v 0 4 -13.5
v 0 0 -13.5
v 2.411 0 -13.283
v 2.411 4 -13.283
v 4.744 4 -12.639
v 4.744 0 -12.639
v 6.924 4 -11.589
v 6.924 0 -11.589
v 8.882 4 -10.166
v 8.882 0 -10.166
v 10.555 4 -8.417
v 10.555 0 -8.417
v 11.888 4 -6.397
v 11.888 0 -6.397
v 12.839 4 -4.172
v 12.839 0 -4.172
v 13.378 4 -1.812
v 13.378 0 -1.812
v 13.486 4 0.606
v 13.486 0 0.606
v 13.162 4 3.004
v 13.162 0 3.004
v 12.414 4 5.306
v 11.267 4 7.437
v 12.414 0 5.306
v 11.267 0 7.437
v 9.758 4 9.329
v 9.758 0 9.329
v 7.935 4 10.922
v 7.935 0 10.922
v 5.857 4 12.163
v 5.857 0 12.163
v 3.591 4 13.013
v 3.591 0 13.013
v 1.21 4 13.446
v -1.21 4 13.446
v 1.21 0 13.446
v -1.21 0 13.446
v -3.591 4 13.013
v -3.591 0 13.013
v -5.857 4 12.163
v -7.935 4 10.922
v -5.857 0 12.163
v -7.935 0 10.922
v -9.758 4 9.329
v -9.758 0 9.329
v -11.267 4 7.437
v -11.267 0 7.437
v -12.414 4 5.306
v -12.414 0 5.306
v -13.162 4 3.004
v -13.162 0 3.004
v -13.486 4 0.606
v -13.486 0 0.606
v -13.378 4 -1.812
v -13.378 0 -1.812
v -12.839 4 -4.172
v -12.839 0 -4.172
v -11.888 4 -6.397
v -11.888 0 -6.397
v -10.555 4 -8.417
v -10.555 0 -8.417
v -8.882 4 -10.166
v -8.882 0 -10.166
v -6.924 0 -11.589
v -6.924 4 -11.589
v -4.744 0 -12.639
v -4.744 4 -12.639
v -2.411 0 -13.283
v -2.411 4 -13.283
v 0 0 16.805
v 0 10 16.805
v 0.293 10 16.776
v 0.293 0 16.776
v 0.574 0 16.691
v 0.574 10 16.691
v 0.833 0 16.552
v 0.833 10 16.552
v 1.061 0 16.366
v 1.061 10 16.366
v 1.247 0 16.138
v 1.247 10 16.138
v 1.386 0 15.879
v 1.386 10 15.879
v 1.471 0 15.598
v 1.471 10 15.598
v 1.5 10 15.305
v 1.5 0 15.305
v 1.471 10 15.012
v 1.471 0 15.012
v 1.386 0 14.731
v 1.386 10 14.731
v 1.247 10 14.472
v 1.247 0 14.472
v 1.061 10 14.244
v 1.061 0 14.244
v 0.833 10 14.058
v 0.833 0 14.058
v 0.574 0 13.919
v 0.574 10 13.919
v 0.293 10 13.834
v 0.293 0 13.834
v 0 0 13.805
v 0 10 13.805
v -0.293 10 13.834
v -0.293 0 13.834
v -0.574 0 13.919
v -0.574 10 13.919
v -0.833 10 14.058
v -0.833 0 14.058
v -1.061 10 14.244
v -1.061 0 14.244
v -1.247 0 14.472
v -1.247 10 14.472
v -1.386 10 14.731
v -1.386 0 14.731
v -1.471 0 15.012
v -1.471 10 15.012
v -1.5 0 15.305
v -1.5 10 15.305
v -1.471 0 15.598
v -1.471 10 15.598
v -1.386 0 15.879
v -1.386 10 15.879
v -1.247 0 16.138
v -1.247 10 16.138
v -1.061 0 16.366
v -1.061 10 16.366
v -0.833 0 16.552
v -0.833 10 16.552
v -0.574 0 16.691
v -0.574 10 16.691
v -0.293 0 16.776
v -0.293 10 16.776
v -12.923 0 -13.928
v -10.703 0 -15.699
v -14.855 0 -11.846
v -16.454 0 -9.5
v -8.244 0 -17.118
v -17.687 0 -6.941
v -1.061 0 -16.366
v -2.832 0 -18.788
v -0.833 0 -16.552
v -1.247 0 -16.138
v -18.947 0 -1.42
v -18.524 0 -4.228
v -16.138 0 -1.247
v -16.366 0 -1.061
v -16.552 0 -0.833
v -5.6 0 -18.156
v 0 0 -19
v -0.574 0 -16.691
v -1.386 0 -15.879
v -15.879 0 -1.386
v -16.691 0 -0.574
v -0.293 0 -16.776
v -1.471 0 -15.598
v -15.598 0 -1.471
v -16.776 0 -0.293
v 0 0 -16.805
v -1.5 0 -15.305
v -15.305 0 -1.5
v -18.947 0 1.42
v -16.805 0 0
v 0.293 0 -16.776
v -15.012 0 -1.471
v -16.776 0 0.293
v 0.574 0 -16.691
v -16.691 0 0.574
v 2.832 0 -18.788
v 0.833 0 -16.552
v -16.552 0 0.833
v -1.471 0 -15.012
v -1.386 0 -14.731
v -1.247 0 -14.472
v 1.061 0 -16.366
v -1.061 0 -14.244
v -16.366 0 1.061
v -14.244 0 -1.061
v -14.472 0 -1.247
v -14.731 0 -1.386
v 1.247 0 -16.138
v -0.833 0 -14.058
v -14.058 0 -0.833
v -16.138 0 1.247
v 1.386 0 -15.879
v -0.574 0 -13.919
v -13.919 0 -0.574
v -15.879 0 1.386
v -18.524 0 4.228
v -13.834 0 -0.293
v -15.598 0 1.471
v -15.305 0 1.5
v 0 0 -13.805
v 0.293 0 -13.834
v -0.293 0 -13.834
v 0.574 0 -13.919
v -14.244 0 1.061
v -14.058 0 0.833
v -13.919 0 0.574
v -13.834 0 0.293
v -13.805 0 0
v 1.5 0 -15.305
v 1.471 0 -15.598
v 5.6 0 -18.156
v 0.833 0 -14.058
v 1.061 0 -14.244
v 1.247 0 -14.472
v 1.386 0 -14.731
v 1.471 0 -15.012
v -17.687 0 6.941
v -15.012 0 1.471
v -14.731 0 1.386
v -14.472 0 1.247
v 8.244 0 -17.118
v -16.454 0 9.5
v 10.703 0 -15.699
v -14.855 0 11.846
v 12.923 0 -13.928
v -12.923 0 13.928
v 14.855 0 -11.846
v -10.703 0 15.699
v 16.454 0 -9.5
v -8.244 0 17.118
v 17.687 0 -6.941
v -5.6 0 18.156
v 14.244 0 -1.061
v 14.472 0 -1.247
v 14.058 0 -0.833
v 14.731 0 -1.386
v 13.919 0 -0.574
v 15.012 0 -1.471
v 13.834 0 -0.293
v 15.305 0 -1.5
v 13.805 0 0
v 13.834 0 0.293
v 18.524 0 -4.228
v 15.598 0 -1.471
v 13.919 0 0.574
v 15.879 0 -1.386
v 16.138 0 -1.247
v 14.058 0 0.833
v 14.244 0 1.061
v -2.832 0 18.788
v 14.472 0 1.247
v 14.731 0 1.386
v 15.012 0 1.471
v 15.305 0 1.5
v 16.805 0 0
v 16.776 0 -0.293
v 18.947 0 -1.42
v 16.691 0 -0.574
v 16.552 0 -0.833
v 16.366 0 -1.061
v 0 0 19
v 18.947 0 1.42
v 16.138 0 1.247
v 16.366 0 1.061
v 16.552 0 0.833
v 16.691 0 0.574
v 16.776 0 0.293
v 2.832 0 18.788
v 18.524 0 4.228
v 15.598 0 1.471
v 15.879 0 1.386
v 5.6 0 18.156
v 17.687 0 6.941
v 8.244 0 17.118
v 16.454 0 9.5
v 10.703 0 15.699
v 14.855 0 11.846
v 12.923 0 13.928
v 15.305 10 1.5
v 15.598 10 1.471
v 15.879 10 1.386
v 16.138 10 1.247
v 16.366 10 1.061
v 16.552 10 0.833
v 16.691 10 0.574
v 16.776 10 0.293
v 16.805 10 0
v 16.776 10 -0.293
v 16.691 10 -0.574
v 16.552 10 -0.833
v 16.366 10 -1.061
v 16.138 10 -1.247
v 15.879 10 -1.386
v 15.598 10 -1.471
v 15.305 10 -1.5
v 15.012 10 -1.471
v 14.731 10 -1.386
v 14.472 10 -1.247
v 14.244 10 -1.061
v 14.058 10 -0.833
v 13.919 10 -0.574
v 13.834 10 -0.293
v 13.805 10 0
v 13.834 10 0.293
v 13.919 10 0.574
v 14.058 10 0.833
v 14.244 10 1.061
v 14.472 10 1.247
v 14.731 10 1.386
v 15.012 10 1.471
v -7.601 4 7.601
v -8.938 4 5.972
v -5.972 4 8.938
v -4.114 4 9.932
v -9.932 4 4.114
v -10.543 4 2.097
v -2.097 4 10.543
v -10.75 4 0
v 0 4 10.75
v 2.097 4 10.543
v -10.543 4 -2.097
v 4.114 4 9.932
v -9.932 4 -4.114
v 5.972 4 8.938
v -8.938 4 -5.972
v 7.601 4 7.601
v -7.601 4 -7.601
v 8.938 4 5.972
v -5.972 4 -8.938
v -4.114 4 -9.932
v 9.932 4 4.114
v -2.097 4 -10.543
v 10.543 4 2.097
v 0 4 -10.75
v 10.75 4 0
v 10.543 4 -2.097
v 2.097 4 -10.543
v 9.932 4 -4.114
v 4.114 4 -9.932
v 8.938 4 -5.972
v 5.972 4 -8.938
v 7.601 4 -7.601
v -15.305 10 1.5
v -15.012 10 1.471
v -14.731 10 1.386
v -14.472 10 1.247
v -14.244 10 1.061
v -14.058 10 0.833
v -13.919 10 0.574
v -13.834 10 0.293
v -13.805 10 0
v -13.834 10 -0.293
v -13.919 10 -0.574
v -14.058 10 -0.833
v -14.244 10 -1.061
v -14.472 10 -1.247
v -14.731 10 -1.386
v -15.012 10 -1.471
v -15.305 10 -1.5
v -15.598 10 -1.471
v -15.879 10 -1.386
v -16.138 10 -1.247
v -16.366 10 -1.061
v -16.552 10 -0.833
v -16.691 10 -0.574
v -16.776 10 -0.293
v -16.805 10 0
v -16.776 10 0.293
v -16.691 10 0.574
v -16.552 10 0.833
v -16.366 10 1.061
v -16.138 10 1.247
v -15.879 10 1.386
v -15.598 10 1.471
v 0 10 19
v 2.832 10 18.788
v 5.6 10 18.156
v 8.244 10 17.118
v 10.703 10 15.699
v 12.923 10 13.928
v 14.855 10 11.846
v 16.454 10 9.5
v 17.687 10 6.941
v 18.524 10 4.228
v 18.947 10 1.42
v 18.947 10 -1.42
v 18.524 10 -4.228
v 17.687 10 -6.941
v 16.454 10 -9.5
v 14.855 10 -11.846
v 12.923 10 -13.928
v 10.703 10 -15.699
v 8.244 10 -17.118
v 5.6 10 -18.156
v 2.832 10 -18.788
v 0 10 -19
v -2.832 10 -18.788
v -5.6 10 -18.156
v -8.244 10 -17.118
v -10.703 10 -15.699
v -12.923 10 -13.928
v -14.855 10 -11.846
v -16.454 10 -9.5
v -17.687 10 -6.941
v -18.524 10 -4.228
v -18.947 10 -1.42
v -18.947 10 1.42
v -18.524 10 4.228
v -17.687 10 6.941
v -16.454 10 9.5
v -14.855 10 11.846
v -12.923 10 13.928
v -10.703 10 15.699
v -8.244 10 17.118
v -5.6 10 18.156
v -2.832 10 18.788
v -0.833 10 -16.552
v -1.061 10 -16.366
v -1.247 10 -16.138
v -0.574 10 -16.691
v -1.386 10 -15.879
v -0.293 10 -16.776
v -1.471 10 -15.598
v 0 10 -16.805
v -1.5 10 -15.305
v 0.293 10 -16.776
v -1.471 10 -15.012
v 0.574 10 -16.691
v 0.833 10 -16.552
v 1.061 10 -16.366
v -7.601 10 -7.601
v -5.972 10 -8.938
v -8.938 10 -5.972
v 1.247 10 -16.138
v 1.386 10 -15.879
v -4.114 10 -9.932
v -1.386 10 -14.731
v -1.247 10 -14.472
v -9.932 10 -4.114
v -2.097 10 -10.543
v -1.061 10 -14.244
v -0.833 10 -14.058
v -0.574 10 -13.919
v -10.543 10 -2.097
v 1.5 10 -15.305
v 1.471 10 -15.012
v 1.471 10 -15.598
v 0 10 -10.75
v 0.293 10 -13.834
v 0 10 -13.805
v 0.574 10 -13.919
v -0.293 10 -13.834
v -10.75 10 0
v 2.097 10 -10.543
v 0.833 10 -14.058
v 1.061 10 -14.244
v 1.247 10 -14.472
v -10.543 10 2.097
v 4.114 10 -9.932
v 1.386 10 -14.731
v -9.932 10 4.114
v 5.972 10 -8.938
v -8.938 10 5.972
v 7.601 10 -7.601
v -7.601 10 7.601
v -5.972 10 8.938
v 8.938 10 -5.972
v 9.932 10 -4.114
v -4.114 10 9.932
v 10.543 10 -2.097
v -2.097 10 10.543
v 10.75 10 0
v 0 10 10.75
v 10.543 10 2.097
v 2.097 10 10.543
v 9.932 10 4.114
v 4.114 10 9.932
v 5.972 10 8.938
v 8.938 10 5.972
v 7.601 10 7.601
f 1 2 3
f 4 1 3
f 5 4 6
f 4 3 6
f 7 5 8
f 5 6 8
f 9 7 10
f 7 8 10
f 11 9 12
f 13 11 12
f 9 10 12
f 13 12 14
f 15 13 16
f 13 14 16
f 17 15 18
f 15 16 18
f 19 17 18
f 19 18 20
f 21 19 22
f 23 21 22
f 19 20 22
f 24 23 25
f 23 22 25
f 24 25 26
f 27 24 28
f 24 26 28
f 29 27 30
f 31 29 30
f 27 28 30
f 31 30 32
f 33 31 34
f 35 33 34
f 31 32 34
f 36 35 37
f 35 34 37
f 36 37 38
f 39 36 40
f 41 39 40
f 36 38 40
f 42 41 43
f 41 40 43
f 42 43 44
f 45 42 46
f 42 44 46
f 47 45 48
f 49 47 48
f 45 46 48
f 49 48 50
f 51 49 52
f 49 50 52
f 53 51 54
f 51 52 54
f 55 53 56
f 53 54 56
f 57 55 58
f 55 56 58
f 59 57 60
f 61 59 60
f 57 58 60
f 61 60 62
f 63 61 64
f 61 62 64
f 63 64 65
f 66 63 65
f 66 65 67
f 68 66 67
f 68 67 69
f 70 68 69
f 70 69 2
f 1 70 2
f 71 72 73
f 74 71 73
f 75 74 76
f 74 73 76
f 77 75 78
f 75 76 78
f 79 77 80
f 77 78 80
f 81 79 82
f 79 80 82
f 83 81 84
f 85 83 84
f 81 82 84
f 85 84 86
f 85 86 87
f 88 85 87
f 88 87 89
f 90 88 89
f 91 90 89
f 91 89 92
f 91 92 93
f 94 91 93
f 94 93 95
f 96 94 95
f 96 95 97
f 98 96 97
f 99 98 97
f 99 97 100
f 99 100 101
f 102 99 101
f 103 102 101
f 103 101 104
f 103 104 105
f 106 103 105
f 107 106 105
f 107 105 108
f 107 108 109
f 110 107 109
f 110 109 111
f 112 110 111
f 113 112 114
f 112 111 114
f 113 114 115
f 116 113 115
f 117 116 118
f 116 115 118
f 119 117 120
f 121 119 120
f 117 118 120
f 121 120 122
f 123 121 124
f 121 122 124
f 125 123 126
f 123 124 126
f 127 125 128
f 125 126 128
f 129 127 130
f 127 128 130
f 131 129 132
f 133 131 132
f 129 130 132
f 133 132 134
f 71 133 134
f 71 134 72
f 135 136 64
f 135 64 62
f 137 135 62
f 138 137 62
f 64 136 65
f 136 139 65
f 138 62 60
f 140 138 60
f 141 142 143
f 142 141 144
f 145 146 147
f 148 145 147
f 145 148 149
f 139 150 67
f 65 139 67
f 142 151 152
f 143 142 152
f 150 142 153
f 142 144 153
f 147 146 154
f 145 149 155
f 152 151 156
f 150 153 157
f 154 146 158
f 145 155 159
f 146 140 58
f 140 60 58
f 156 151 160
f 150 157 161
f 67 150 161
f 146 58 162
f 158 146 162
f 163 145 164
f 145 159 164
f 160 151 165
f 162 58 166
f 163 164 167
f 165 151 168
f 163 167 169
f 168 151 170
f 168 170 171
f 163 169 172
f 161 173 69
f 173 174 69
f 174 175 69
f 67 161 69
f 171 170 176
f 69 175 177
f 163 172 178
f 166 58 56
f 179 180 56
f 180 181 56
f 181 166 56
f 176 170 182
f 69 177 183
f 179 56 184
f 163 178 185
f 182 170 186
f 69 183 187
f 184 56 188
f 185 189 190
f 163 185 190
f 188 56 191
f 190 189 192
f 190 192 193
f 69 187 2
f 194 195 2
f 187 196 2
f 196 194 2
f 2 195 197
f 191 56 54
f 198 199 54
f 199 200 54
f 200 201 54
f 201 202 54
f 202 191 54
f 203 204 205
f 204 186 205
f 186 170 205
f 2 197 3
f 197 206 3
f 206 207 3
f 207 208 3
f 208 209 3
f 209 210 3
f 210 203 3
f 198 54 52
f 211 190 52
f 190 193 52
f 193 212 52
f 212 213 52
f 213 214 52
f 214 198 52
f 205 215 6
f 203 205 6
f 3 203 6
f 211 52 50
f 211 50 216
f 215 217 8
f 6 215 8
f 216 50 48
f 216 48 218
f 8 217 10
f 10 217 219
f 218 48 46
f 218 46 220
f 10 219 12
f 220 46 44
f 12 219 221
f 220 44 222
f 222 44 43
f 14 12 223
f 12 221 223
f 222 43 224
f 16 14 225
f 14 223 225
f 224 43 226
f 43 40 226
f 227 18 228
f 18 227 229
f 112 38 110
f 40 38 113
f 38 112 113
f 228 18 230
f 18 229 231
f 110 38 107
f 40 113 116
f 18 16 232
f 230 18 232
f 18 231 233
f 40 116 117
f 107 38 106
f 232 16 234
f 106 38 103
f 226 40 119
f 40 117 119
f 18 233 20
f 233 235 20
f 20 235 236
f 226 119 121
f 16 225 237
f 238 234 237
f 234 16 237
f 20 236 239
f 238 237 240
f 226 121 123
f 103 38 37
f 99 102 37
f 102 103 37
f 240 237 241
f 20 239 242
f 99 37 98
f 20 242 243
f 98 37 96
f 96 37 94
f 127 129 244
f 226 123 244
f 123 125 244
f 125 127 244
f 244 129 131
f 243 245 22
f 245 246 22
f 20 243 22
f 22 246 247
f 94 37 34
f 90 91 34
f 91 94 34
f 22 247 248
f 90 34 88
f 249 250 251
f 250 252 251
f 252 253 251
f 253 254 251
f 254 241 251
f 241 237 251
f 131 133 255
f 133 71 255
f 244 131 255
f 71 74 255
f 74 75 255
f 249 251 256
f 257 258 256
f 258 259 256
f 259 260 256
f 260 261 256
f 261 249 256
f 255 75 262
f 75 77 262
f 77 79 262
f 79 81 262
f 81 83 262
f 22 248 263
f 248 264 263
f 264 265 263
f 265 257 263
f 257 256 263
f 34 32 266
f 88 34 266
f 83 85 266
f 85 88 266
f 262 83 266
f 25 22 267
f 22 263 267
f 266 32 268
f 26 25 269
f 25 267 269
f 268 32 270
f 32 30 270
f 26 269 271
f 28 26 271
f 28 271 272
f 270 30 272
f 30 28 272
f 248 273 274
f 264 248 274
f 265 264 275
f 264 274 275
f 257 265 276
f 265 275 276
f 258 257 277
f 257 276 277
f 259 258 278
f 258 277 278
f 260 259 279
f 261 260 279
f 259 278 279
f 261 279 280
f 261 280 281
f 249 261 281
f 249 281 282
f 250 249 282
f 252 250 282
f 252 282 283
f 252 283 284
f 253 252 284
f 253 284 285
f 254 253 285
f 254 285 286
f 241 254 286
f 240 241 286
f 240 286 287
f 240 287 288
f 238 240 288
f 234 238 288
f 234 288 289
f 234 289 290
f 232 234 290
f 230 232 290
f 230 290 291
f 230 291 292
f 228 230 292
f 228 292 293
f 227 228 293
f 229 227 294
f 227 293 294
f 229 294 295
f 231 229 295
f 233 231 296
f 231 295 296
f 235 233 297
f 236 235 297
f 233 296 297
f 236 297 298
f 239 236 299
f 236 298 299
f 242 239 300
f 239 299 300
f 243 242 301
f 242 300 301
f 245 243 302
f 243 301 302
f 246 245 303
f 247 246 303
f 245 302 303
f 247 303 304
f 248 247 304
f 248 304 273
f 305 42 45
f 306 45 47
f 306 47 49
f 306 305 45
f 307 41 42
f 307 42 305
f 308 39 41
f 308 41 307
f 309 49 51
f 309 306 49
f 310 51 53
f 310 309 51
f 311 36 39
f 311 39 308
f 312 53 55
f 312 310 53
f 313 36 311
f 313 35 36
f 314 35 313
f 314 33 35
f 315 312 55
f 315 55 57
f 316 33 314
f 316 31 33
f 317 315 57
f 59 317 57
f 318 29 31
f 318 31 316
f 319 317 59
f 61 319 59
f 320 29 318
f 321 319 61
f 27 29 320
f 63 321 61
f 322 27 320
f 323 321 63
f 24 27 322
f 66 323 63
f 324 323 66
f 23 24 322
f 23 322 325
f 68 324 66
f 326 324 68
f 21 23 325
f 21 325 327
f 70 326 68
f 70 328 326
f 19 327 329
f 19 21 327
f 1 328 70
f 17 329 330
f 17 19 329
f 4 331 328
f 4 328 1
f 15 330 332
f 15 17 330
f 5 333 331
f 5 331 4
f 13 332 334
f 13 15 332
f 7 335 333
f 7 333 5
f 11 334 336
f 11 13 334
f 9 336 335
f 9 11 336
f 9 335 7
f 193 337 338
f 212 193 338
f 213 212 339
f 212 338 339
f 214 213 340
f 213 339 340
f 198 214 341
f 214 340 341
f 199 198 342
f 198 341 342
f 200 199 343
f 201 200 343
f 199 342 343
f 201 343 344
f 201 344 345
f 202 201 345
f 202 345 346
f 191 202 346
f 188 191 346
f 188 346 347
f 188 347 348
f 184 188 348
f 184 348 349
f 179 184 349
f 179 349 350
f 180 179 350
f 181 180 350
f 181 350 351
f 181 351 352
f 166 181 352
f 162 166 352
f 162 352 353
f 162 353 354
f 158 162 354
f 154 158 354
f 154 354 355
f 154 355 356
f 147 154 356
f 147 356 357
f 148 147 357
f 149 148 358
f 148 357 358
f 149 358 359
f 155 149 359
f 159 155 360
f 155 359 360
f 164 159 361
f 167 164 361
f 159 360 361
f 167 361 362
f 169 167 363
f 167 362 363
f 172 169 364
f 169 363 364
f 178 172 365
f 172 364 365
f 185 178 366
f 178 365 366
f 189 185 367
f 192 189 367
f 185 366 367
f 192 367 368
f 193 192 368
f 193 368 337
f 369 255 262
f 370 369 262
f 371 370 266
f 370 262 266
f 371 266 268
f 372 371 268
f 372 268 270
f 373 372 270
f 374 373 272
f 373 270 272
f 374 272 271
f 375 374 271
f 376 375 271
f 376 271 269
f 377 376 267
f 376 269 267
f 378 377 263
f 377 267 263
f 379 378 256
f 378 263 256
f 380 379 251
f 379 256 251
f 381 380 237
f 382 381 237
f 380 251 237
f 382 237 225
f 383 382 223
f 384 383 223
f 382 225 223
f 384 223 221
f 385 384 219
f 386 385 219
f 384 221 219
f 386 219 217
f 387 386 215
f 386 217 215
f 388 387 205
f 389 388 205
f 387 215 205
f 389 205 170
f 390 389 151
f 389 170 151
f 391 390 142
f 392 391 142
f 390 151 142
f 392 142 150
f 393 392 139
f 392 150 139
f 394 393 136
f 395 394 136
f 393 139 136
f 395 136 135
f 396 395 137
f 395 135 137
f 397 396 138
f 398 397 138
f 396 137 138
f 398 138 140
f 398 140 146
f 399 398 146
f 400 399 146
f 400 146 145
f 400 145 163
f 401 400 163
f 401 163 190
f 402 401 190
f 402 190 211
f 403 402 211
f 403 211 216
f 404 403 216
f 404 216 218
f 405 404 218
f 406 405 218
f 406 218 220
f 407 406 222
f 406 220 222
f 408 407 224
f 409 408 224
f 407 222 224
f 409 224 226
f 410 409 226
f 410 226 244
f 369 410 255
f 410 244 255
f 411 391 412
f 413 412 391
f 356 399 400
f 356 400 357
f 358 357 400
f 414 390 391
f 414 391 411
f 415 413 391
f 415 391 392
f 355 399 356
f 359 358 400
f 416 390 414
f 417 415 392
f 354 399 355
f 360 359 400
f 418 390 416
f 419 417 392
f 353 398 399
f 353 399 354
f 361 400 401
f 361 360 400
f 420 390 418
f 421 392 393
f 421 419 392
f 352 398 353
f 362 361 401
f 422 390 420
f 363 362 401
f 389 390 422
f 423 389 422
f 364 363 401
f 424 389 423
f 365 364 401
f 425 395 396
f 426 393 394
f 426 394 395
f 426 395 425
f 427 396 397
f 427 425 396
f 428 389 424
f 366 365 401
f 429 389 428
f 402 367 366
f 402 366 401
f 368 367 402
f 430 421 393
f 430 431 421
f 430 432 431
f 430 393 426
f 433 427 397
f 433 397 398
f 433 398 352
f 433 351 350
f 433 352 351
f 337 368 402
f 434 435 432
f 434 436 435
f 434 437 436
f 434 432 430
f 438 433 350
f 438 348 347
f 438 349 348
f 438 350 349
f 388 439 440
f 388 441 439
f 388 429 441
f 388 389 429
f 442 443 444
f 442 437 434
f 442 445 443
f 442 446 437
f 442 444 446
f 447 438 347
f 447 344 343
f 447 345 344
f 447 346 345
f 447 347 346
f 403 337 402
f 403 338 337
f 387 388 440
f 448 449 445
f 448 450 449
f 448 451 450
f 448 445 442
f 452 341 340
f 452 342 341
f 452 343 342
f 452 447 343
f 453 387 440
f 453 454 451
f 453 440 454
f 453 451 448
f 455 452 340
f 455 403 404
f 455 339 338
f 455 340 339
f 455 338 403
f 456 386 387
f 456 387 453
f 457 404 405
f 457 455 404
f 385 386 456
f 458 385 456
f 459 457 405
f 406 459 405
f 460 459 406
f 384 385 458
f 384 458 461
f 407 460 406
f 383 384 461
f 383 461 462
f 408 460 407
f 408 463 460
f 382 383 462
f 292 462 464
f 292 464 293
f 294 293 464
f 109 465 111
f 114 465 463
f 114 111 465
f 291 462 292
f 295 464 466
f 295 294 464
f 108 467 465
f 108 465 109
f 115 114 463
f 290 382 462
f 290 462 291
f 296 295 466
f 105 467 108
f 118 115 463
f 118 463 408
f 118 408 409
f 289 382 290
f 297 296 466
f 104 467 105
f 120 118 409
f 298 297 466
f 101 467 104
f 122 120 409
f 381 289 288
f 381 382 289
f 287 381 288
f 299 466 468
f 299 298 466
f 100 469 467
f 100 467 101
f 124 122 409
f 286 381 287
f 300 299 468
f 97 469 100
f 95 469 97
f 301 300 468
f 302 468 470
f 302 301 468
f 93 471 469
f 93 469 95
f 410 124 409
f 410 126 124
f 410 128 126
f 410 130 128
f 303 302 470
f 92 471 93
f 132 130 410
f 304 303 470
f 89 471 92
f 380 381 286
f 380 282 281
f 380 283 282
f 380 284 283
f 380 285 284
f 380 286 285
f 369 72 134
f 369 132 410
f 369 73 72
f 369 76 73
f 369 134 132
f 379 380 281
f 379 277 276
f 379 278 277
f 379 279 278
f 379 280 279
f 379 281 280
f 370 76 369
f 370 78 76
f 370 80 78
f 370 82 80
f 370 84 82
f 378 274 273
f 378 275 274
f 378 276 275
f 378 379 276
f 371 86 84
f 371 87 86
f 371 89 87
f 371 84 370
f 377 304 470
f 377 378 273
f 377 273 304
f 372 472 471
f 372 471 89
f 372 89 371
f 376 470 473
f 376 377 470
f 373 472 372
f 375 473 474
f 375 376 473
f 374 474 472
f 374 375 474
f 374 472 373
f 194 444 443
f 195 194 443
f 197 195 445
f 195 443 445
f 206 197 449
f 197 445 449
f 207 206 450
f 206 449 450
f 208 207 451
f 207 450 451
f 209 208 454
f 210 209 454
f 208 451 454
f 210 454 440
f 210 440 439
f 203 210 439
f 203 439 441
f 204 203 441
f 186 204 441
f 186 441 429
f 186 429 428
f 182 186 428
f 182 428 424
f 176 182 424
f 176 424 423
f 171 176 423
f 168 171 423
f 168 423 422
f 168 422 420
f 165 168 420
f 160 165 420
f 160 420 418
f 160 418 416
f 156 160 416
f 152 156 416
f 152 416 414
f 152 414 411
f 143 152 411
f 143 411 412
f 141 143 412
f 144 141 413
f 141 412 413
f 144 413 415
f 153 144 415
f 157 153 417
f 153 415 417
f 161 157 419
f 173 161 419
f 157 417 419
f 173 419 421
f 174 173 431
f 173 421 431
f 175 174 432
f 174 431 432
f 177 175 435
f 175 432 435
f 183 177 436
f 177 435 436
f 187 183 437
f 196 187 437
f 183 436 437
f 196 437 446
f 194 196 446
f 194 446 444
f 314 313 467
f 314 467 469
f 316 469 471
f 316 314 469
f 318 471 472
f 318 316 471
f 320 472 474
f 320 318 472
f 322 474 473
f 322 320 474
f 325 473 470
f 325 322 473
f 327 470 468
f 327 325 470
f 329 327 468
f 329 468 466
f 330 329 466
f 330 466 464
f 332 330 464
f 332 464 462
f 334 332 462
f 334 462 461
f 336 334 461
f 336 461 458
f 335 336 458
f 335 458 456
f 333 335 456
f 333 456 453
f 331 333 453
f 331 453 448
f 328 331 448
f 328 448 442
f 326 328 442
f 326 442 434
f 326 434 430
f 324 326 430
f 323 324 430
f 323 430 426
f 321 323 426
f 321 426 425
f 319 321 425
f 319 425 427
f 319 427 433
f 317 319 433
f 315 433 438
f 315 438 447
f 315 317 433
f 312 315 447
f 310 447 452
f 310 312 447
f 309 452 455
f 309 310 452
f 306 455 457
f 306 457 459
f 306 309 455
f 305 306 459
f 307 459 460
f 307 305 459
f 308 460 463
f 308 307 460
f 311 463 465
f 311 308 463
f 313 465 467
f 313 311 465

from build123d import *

# Parameters (mm, degrees)
SKETCH1_R          = 19
SKETCH1_R_2        = 10.75
EXTRUDE1_DEPTH     = 10
SKETCH2_R          = 13.5
CUT_EXTRUDE1_DEPTH = 4
SKETCH3_R          = 1.5
CUT_EXTRUDE2_DEPTH = 29.670542374


with BuildPart() as part:
    # Sketch1 → Extrude1 (new body)
    with BuildSketch(Plane(origin=(0, 0, 0), x_dir=(1, 0, 0), z_dir=(0, 1, 0))):
        with Locations(Location((0, 0, 0), (0, 0, 270))):
            Circle(SKETCH1_R)
        with Locations(Location((0, 0, 0), (0, 0, 270))):
            Circle(SKETCH1_R_2, mode=Mode.SUBTRACT)
    extrude(amount=EXTRUDE1_DEPTH)

    # Sketch2 → Cut-Extrude1 (cut)
    with BuildSketch(Plane.XZ):
        with Locations(Location((0, 0, 0), (0, 0, 270))):
            Circle(SKETCH2_R)
    extrude(amount=-CUT_EXTRUDE1_DEPTH, mode=Mode.SUBTRACT)

    # Sketch3 → Cut-Extrude2 (cut, through all)
    with BuildSketch(Plane(origin=(0, 10, 0), x_dir=(1, 0, 0), z_dir=(0, 1, 0))):
        with Locations(Location((0, 15.305022153, 0), (0, 0, 270))):
            Circle(SKETCH3_R)
        with Locations(Location((15.305022153, 0, 0), (0, 0, 270))):
            Circle(SKETCH3_R)
        with Locations(Location((0, -15.305022153, 0), (0, 0, 270))):
            Circle(SKETCH3_R)
        with Locations(Location((-15.305022153, 0, 0), (0, 0, 270))):
            Circle(SKETCH3_R)
    extrude(amount=-CUT_EXTRUDE2_DEPTH, mode=Mode.SUBTRACT)


solid = part.part
